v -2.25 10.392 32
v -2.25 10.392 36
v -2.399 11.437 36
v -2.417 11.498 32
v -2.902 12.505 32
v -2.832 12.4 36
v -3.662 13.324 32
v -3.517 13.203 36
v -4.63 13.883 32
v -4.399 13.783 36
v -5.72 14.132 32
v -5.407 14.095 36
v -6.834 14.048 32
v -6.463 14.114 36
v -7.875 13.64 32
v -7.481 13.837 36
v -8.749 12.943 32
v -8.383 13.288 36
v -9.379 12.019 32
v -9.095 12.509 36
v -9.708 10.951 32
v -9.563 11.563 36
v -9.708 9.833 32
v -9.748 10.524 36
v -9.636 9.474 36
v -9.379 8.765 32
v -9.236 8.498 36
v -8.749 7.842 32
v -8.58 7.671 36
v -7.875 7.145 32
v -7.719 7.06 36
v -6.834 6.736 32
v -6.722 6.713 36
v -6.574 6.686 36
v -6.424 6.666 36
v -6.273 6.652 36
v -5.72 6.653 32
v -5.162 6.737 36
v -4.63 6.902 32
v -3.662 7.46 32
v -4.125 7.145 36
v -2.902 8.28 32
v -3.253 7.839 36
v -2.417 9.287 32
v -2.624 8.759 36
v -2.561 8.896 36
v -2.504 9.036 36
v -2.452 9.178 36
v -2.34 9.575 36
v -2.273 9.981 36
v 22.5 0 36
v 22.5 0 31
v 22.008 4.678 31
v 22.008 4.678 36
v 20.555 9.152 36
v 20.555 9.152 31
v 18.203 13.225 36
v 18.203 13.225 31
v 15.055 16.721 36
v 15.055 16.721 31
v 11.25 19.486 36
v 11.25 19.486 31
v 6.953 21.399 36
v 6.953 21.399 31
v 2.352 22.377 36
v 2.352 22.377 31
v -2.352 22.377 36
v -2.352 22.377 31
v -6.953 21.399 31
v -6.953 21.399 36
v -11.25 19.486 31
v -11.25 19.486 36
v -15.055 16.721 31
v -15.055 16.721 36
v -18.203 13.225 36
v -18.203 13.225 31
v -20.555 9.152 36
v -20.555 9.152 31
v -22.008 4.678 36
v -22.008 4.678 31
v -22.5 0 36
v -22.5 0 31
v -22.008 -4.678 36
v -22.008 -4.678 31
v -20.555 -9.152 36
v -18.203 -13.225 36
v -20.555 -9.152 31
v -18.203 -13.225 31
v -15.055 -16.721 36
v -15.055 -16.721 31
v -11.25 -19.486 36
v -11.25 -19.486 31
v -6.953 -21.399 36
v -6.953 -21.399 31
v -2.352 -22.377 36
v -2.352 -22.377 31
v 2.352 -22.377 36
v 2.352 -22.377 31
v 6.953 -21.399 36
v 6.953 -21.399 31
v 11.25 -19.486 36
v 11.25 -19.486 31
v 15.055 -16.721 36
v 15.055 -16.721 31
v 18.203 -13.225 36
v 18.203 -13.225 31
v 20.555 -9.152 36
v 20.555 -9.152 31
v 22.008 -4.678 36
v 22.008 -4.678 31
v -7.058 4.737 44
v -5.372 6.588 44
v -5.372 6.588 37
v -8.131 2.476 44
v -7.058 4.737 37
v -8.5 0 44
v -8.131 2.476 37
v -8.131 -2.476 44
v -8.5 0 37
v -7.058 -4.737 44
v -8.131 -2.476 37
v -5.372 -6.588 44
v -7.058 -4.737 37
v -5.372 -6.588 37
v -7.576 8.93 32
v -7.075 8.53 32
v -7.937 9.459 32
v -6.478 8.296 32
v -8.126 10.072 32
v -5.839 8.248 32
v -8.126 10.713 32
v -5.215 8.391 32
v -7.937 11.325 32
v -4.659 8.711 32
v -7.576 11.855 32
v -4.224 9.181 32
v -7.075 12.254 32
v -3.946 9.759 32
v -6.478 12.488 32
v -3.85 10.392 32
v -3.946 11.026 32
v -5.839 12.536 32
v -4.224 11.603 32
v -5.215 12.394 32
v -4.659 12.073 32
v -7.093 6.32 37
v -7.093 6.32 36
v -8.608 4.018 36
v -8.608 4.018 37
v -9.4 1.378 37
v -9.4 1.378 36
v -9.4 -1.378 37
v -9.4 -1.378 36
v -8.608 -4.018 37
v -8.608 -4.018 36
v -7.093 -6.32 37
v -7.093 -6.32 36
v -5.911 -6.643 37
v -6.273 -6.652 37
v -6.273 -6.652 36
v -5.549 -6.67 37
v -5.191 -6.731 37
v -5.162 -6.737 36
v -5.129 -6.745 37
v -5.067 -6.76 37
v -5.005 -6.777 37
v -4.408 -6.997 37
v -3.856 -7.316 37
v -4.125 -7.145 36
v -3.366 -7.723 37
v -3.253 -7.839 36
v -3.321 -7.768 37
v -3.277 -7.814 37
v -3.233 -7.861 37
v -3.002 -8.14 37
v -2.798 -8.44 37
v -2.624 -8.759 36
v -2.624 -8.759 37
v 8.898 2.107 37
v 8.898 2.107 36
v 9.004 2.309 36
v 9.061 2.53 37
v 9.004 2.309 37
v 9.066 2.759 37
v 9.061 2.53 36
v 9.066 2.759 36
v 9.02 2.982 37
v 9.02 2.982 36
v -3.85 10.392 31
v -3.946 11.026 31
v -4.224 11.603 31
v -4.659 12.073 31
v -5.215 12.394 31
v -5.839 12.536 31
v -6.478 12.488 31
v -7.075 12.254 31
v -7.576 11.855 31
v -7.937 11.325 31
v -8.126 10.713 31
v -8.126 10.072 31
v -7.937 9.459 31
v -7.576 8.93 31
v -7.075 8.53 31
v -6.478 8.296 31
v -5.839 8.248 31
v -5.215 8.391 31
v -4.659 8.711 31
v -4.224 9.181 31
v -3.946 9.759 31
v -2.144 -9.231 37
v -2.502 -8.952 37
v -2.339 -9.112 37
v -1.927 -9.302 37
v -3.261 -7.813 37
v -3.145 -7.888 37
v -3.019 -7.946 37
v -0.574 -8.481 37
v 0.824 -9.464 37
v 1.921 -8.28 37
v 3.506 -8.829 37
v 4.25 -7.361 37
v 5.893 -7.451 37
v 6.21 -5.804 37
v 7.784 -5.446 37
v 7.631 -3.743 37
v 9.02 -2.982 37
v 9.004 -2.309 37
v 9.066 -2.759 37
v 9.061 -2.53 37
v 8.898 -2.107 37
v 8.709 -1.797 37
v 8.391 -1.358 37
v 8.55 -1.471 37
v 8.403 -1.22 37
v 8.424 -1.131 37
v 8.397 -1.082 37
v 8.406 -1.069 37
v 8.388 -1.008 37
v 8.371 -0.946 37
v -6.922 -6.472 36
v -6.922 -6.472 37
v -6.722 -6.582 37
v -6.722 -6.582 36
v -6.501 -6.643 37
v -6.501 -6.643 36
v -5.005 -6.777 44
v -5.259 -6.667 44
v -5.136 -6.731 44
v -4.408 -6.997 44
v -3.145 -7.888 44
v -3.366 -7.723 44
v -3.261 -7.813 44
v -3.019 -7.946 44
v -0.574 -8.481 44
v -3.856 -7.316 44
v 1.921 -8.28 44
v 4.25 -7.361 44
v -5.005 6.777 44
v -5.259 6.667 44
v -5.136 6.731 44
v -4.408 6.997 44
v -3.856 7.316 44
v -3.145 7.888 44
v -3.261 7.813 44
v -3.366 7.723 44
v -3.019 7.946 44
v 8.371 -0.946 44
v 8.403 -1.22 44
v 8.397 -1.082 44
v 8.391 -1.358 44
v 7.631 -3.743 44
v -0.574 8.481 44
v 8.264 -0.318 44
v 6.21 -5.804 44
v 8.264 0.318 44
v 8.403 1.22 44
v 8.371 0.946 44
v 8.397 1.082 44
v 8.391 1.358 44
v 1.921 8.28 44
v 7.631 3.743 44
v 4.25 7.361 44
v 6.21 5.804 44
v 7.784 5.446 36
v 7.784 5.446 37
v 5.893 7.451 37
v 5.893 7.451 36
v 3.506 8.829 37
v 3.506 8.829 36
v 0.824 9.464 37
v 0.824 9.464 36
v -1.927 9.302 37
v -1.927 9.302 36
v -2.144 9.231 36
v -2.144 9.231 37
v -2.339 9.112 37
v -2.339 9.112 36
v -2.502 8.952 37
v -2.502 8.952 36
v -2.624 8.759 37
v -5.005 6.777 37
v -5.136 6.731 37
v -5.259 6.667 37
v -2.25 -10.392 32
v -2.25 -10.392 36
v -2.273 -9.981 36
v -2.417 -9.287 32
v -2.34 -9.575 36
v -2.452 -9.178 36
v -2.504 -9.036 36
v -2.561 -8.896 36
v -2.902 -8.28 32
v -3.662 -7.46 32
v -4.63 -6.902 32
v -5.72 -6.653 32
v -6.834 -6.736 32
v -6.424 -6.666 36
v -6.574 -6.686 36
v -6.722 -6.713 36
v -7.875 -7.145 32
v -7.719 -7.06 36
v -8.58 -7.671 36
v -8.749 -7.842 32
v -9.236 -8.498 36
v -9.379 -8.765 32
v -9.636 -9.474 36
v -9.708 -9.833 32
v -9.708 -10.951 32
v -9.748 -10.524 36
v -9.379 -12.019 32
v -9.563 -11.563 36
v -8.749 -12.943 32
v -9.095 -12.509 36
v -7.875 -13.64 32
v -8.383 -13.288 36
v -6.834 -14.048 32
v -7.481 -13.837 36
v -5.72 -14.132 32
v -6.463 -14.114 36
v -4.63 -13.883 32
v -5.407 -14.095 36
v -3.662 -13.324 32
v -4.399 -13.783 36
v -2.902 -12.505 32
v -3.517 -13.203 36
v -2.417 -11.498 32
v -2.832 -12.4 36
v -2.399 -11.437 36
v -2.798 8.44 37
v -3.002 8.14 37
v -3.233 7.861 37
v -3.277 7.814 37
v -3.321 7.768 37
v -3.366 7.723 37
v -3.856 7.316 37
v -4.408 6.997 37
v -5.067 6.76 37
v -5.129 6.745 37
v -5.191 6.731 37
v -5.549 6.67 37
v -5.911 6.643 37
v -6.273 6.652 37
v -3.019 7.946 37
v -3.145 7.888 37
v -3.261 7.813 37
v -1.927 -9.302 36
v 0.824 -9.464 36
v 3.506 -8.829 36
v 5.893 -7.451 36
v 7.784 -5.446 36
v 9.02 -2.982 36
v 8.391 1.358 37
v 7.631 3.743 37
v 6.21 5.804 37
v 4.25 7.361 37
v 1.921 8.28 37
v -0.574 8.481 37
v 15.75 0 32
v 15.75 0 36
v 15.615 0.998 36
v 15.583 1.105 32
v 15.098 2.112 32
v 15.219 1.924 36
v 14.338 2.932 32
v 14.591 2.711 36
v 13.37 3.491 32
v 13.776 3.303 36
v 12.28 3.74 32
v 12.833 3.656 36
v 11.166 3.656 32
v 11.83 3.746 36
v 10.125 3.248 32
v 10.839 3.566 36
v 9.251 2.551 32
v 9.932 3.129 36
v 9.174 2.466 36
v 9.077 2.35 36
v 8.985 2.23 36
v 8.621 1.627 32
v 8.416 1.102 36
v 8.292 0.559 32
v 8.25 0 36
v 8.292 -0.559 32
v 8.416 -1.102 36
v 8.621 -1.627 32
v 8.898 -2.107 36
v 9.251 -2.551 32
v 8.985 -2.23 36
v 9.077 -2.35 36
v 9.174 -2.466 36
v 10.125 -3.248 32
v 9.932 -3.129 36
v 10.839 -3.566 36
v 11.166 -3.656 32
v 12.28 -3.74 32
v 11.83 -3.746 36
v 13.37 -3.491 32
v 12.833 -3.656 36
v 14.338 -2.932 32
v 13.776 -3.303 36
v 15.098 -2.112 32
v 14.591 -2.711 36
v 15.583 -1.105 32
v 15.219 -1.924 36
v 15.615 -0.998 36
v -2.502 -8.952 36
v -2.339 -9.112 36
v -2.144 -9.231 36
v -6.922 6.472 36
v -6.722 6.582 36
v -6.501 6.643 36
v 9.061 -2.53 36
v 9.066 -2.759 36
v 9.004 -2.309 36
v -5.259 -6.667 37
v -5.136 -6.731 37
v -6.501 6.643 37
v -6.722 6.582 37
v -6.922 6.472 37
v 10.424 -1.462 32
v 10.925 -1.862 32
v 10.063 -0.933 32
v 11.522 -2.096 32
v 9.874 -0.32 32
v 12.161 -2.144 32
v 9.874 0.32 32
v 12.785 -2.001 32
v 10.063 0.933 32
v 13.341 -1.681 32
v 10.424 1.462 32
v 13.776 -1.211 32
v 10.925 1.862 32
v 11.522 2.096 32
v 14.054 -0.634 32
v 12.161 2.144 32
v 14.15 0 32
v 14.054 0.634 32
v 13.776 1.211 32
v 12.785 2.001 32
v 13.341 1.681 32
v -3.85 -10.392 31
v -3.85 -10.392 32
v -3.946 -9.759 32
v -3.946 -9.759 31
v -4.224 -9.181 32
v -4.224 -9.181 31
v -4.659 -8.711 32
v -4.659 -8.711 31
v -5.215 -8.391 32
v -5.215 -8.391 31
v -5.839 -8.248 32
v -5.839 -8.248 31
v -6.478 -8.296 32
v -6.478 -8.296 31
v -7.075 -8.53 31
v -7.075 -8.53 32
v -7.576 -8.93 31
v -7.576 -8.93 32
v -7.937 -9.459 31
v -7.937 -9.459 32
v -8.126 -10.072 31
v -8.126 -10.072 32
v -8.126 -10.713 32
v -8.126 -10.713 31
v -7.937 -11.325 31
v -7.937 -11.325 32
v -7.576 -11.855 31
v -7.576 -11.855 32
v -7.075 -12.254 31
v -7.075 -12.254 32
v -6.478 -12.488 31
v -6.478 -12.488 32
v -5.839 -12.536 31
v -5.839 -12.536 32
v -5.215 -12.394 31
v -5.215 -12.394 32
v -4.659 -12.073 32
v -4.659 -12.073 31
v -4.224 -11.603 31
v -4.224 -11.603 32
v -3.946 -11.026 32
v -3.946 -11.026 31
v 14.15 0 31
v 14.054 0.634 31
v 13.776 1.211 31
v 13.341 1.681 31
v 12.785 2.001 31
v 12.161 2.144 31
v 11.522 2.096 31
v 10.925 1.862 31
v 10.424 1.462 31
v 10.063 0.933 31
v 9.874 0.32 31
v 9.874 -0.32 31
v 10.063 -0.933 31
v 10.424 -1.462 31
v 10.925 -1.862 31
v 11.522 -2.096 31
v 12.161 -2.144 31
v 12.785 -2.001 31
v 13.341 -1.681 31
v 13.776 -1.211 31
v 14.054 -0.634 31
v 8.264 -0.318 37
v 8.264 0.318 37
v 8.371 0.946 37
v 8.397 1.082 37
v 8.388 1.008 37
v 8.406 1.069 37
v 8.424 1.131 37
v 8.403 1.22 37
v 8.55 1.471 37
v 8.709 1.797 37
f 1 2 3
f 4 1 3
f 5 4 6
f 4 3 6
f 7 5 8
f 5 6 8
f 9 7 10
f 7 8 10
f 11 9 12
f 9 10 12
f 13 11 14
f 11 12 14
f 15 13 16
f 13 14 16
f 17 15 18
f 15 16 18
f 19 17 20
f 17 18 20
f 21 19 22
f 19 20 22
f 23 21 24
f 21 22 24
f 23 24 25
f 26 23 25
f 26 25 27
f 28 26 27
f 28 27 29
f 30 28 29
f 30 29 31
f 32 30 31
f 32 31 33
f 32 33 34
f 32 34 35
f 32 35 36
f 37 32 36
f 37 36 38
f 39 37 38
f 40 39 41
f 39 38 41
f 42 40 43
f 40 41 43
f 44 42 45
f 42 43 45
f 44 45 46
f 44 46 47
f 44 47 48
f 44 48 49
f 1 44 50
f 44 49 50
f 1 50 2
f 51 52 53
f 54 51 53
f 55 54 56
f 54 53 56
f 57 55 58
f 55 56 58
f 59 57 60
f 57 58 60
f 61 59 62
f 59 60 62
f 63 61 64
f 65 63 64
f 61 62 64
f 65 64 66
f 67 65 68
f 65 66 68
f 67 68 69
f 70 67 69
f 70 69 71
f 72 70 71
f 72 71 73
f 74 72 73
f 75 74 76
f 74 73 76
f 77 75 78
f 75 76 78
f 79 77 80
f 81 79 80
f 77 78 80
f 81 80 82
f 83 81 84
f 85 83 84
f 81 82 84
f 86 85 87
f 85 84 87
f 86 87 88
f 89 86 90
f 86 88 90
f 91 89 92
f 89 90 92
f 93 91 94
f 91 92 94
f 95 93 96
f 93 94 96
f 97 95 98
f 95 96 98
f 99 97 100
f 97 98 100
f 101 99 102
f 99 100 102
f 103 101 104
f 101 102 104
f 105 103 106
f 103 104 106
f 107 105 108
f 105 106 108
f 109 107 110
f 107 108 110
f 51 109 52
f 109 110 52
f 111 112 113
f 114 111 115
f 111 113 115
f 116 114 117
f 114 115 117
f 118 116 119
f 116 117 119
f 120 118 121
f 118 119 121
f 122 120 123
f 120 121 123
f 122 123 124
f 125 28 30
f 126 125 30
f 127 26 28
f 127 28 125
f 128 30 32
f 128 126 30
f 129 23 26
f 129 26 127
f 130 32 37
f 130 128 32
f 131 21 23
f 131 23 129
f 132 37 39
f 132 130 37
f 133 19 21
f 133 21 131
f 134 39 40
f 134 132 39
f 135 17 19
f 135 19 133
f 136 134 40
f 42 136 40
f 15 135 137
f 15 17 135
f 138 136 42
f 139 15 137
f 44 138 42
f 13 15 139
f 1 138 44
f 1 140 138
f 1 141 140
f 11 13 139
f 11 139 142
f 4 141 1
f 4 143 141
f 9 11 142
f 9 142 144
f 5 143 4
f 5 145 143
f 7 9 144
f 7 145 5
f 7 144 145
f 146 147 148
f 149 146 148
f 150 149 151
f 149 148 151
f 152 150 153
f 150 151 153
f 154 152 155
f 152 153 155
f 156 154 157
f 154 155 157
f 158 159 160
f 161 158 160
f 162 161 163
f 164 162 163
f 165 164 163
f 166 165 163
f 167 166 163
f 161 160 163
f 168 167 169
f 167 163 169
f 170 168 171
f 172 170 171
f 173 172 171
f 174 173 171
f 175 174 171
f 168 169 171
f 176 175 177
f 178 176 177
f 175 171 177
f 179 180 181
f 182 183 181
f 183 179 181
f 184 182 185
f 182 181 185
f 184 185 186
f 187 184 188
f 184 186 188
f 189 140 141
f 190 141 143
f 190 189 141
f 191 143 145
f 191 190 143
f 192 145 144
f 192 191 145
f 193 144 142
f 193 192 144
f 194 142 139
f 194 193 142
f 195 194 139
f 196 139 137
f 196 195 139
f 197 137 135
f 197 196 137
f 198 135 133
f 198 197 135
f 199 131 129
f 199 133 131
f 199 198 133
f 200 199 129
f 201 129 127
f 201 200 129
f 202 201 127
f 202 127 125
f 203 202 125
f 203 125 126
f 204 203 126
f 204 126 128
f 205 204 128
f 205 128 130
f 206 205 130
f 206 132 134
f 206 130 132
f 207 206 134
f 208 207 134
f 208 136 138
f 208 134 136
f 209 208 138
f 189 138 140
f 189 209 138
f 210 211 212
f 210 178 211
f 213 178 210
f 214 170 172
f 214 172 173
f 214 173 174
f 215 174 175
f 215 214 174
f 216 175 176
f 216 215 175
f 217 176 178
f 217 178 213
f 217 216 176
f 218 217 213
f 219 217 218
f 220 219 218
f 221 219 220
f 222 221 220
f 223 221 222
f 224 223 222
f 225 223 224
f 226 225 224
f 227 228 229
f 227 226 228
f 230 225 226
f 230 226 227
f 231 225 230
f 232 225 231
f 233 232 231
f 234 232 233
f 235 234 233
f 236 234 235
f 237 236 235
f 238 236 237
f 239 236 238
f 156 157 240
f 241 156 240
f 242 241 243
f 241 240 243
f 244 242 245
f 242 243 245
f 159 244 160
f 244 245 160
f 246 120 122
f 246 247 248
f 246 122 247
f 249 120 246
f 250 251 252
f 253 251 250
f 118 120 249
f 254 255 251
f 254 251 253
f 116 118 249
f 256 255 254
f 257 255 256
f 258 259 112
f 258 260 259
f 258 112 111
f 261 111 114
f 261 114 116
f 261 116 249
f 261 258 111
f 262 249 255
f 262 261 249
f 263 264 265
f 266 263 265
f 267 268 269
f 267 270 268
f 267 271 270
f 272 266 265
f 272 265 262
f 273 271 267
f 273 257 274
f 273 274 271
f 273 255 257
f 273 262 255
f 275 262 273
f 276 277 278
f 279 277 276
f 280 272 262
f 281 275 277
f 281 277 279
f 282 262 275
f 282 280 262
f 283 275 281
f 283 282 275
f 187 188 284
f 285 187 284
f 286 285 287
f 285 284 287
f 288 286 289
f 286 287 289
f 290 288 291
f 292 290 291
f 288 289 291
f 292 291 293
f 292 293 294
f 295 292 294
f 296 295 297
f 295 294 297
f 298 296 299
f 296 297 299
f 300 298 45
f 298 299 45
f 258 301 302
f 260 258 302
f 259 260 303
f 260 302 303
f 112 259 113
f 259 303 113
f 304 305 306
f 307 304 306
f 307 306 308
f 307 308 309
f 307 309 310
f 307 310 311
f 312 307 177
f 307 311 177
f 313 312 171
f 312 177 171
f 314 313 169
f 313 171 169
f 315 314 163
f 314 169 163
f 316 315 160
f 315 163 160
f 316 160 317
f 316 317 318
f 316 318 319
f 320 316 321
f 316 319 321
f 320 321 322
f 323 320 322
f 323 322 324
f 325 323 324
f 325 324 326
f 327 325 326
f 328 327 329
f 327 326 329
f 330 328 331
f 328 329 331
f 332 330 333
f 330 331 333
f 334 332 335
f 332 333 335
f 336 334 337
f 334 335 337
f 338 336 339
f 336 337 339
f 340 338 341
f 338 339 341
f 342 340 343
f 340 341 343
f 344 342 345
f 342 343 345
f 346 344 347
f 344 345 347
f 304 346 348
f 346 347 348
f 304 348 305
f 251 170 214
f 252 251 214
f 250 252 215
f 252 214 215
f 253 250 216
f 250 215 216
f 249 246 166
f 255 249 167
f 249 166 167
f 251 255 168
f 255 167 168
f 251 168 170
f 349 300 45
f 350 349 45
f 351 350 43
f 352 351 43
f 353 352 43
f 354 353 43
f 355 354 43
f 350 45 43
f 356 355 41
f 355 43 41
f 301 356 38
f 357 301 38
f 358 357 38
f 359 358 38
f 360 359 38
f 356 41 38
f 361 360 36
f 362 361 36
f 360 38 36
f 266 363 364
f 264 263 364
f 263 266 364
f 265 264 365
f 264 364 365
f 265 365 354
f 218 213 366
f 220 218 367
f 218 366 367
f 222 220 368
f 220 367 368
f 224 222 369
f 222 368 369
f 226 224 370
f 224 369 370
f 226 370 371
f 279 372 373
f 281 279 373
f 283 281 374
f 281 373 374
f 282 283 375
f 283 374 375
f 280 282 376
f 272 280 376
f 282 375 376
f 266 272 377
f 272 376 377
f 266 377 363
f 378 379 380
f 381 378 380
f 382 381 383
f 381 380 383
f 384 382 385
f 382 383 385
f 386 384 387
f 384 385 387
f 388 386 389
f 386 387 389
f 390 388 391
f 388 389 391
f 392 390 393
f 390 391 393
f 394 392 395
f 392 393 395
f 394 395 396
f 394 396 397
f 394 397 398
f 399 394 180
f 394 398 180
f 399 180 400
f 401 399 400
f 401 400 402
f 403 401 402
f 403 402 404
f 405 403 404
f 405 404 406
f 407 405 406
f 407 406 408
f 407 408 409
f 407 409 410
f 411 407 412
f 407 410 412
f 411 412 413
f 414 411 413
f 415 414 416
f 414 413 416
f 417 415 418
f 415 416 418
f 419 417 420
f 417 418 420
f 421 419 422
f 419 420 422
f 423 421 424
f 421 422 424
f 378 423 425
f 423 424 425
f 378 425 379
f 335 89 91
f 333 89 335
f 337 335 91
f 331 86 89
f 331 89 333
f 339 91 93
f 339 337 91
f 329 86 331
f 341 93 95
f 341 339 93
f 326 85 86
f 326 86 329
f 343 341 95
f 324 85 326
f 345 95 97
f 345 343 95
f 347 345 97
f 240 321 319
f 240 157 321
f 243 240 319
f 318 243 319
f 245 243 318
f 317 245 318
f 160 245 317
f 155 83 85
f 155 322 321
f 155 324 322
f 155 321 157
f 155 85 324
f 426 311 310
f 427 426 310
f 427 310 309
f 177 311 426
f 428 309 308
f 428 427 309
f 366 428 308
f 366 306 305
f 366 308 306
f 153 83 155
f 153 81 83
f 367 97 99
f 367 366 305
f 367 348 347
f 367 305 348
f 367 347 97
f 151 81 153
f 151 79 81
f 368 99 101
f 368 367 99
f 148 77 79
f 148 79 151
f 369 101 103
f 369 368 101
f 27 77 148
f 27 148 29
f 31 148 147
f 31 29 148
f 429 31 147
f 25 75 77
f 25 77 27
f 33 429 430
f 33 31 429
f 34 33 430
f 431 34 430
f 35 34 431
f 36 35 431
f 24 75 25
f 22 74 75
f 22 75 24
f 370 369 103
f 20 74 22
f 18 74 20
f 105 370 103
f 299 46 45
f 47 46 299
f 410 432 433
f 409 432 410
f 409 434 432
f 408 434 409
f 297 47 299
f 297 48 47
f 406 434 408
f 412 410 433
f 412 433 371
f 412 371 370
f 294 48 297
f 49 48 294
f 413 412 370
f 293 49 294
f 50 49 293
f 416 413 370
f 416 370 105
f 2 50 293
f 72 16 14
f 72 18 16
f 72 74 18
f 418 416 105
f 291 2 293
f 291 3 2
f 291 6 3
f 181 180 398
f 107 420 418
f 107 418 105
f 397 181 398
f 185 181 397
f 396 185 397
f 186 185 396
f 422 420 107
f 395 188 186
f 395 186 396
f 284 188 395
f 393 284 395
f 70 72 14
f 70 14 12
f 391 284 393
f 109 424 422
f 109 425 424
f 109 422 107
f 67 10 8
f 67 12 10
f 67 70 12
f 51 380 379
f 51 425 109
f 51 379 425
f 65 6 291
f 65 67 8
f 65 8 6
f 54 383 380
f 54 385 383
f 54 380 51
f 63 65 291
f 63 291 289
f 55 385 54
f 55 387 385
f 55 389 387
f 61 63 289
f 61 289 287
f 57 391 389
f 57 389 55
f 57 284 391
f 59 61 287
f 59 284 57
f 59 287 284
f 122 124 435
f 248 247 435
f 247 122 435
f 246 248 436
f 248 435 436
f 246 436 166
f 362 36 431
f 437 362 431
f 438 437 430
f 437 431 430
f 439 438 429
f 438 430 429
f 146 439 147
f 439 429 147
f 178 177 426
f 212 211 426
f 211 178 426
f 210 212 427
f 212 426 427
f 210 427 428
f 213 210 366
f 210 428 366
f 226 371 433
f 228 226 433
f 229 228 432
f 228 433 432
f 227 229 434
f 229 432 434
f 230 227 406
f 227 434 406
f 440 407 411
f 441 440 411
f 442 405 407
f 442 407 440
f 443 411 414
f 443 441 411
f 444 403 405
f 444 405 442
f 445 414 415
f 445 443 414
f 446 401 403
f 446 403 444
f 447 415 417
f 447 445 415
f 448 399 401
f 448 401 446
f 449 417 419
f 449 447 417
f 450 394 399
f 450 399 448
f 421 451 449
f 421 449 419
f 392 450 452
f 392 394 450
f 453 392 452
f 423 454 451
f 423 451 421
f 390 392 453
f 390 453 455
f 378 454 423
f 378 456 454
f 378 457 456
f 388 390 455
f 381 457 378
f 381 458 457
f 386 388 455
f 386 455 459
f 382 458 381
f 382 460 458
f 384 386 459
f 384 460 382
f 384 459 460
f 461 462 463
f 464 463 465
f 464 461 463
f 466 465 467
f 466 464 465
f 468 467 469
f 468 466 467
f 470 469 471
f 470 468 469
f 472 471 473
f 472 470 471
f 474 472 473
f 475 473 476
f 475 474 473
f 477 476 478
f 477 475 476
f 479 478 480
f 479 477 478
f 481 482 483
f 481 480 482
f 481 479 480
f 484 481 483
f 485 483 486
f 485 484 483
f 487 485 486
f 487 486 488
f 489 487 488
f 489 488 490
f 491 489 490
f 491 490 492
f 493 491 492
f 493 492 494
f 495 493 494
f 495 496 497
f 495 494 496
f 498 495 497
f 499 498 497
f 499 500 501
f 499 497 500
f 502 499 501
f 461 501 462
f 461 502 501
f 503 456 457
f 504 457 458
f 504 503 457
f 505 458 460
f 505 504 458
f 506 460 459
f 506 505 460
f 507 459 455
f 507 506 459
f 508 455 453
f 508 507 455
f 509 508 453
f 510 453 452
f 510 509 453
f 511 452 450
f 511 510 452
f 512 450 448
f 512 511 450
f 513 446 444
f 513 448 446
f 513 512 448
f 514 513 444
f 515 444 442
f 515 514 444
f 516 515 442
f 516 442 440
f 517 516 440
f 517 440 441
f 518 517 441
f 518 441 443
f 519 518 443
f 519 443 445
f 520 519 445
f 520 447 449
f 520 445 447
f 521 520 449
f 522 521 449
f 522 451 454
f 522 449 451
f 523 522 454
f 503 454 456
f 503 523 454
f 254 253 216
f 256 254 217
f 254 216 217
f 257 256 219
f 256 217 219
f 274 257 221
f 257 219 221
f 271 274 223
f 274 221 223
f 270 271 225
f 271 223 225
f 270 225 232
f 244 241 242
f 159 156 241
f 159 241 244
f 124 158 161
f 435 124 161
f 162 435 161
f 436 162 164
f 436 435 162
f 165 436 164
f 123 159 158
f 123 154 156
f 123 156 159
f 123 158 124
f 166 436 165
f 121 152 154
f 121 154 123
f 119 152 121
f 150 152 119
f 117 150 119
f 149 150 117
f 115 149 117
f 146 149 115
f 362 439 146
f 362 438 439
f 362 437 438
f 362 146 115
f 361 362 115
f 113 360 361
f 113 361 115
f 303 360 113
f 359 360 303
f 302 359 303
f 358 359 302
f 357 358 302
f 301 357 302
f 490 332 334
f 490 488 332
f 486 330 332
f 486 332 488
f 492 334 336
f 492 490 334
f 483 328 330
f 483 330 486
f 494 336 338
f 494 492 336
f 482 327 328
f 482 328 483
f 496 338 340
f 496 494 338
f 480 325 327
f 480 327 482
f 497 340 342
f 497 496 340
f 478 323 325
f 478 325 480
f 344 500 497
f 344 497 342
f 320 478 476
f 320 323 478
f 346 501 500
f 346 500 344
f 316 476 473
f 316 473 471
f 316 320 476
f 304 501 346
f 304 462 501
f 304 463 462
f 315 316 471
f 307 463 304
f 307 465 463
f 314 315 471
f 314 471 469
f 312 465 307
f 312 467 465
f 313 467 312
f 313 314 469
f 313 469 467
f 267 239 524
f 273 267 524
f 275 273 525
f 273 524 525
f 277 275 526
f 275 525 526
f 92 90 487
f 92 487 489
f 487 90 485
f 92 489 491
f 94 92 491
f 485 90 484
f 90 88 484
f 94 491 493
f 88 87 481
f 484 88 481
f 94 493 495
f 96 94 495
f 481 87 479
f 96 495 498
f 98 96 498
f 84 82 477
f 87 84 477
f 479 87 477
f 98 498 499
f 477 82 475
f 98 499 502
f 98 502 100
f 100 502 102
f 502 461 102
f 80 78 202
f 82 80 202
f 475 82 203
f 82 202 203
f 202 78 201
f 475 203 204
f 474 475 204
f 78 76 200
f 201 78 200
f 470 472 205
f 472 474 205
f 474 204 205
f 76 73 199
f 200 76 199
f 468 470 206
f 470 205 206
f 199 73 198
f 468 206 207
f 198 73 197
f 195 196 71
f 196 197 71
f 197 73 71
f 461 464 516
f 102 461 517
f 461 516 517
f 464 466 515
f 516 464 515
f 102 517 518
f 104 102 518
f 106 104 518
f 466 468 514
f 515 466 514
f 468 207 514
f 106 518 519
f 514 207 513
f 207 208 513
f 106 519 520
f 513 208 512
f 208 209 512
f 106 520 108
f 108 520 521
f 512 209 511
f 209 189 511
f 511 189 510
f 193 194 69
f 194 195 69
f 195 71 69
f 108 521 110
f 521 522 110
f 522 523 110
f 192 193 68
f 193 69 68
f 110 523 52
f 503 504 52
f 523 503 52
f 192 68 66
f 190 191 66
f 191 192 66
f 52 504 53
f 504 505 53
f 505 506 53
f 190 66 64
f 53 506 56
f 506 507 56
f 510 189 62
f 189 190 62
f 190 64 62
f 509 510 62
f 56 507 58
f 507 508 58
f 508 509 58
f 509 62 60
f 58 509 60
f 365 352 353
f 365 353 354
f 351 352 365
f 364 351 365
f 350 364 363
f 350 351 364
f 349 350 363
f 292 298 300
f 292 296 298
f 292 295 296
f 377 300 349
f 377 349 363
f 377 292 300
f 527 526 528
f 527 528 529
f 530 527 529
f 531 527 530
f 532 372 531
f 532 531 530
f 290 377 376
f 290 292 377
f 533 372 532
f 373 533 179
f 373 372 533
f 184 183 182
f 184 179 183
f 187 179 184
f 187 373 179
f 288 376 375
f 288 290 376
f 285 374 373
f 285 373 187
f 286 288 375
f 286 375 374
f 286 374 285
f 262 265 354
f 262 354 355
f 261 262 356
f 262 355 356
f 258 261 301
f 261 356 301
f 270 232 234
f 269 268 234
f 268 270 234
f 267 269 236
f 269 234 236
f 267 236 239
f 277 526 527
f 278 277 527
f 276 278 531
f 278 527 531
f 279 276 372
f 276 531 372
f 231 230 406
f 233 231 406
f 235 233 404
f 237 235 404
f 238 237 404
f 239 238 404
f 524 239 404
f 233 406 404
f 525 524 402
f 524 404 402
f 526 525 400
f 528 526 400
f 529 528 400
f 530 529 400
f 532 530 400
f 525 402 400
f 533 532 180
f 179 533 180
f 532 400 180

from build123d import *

# Parameters (mm, degrees)
SKETCH1_R           = 22.5
SKETCH1_R_2         = 2.15
BOSS_EXTRUDE1_DEPTH = 5
SKETCH2_R           = 3.75
CUT_EXTRUDE1_DEPTH  = 4
BOSS_EXTRUDE2_DEPTH = 1
BOSS_EXTRUDE3_DEPTH = 7
FILLET1_R           = 1


# Read off the part's stored shape, not the designer's step: Boss-Extrude2
with BuildPart() as part:
    # Sketch1 → Boss-Extrude1 (new body)
    with BuildSketch(Plane.XY.offset(31)):
        Circle(SKETCH1_R)
        with Locations((-6, 10.392304845)):
            Circle(SKETCH1_R_2, mode=Mode.SUBTRACT)
        with Locations((-6, -10.392304845)):
            Circle(SKETCH1_R_2, mode=Mode.SUBTRACT)
        with Locations((12, 0)):
            Circle(SKETCH1_R_2, mode=Mode.SUBTRACT)
    extrude(amount=BOSS_EXTRUDE1_DEPTH)

    # Sketch2 → Cut-Extrude1 (cut)
    with BuildSketch(Plane.XY.offset(36)):
        with Locations((-6, 10.392304845)):
            Circle(SKETCH2_R)
        with Locations((12, 0)):
            Circle(SKETCH2_R)
        with Locations((-6, -10.392304845)):
            Circle(SKETCH2_R)
    extrude(amount=-CUT_EXTRUDE1_DEPTH, mode=Mode.SUBTRACT)

    # Boss-Extrude2 outline → Boss-Extrude2 (add)
    with BuildSketch(Plane.XY.offset(36)):
        with BuildLine():
            ThreePointArc((9.174479167, -2.46554903), (8.25, 0), (9.174479167, 2.46554903))
            ThreePointArc((9.174479167, 2.46554903), (4.75, 8.227241336), (-2.452011489, 9.17810654))
            ThreePointArc((-2.452011489, 9.17810654), (-4.125, 7.144709581), (-6.722467678, 6.712557509))
            ThreePointArc((-6.722467678, 6.712557509), (-9.5, 0), (-6.722467678, -6.71255751))
            ThreePointArc((-6.722467678, -6.71255751), (-4.125, -7.144709581), (-2.452011489, -9.17810654))
            ThreePointArc((-2.452011489, -9.17810654), (4.75, -8.227241336), (9.174479167, -2.46554903))
        make_face()
    extrude(amount=BOSS_EXTRUDE2_DEPTH)

    # Sketch4 → Boss-Extrude3 (add)
    with BuildSketch(Plane.XY.offset(37)):
        with BuildLine():
            ThreePointArc((8.424479167, -1.130553303), (8.25, 0), (8.424479167, 1.130553303))
            ThreePointArc((8.424479167, 1.130553303), (4.25, 7.361215932), (-3.233151703, 7.861089623))
            ThreePointArc((-3.233151703, 7.861089623), (-4.125, 7.144709581), (-5.191327464, 6.730536321))
            ThreePointArc((-5.191327464, 6.730536321), (-8.5, 0), (-5.191327464, -6.730536321))
            ThreePointArc((-5.191327464, -6.730536321), (-4.125, -7.144709581), (-3.233151703, -7.861089623))
            ThreePointArc((-3.233151703, -7.861089623), (4.25, -7.361215932), (8.424479167, -1.130553303))
        make_face()
    extrude(amount=BOSS_EXTRUDE3_DEPTH)

    # Fillet1
    # the kernel refuses this fillet: 1 mm, written as the material it takes off along each edge
    with BuildSketch(Plane(origin=(9.174479167, -2.46554903, 36), x_dir=(-0.2868427193714439, -0.9579776898986714, 0), z_dir=(0, 0, 1)), Plane(origin=(-2.452011489, 9.17810654, 36), x_dir=(0.9730543753959973, 0.23057576308603095, 0), z_dir=(0, 0, 1)), Plane(origin=(-6.722467678, -6.71255751, 36), x_dir=(-0.6862116560068084, 0.7274019268330224, 0), z_dir=(0, 0, 1))) as fillet1_piece_1:
        with BuildLine():
            CenterArc((0.510994589, -0.999596963), FILLET1_R, 88.373235151, 52.473151254)
            ThreePointArc((-0.264461334, -0.368195259), (-0.126661785, -0.188097556), (0, 0))
            ThreePointArc((0, 0), (0.269691589, 0.003828853), (0.539383177, 0))
        make_face()
    extrude(amount=2.348457943, mode=Mode.SUBTRACT)
    with BuildSketch(Plane(origin=(9.174479167, 2.46554903, 36), x_dir=(-0.28684271937144556, 0.957977689898671, 0), z_dir=(0, 0, 1)), Plane(origin=(-2.452011489, -9.17810654, 36), x_dir=(0.9730543753972882, -0.23057576308058297, 0), z_dir=(0, 0, 1))) as fillet1_piece_2:
        with BuildLine():
            CenterArc((0.510994589, 0.999596963), FILLET1_R, 219.153613594, 52.473151254)
            ThreePointArc((-0.264461334, 0.368195259), (-0.126661785, 0.188097556), (0, 0))
            ThreePointArc((0, 0), (0.269691589, -0.003828853), (0.539383177, 0))
        make_face()
    extrude(amount=2.348457943, mode=Mode.SUBTRACT)
    with BuildSketch(Plane(origin=(-6.722467678, 6.712557509, 36), x_dir=(-0.686211656019457, -0.72740192682109, 0), z_dir=(0, 0, 1))) as fillet1_piece_3:
        with BuildLine():
            CenterArc((0.510994589, 0.999596963), FILLET1_R, 219.153613615, 52.473151233)
            ThreePointArc((-0.264461334, 0.368195259), (-0.126661785, 0.188097556), (0, 0))
            ThreePointArc((0, 0), (0.269691588, -0.003828853), (0.539383177, 0))
        make_face()
    extrude(amount=2.348457942, mode=Mode.SUBTRACT)
    with BuildSketch(Plane(origin=(8.424479167, -1.130553303, 37), x_dir=(-0.27697269239961747, 0.9608777901819289, 0), z_dir=(0, 0, 1)), Plane(origin=(-3.233151703, 7.861089623, 37), x_dir=(-0.6936582300297728, -0.7203042828638206, 0), z_dir=(0, 0, 1)), Plane(origin=(-5.191327464, -6.730536321, 37), x_dir=(0.9706309224297027, -0.24057350731795996, 0), z_dir=(0, 0, 1))) as fillet1_piece_4:
        with BuildLine():
            CenterArc((0.217604369, 0.999672253), FILLET1_R, 244.726311149, 23.806727181)
            ThreePointArc((-0.20933828, 0.095393549), (-0.104991878, 0.046988536), (0, 0))
            ThreePointArc((0, 0), (0.096001927, 0.001229051), (0.192003855, 0))
        make_face()
    extrude(amount=7.57512197, mode=Mode.SUBTRACT)
    with BuildSketch(Plane(origin=(8.424479167, 1.130553303, 37), x_dir=(-0.27697269239961625, -0.9608777901819292, 0), z_dir=(0, 0, 1)), Plane(origin=(-5.191327464, 6.730536321, 37), x_dir=(0.9706309224296972, 0.24057350731798183, 0), z_dir=(0, 0, 1)), Plane(origin=(-3.233151703, -7.861089623, 37), x_dir=(-0.6936582300297843, 0.7203042828638094, 0), z_dir=(0, 0, 1))) as fillet1_piece_5:
        with BuildLine():
            CenterArc((0.217604369, -0.999672253), FILLET1_R, 91.46696167, 23.806727181)
            ThreePointArc((-0.20933828, -0.095393549), (-0.104991878, -0.046988536), (0, 0))
            ThreePointArc((0, 0), (0.096001927, -0.001229051), (0.192003855, 0))
        make_face()
    extrude(amount=7.57512197, mode=Mode.SUBTRACT)


solid = part.part
